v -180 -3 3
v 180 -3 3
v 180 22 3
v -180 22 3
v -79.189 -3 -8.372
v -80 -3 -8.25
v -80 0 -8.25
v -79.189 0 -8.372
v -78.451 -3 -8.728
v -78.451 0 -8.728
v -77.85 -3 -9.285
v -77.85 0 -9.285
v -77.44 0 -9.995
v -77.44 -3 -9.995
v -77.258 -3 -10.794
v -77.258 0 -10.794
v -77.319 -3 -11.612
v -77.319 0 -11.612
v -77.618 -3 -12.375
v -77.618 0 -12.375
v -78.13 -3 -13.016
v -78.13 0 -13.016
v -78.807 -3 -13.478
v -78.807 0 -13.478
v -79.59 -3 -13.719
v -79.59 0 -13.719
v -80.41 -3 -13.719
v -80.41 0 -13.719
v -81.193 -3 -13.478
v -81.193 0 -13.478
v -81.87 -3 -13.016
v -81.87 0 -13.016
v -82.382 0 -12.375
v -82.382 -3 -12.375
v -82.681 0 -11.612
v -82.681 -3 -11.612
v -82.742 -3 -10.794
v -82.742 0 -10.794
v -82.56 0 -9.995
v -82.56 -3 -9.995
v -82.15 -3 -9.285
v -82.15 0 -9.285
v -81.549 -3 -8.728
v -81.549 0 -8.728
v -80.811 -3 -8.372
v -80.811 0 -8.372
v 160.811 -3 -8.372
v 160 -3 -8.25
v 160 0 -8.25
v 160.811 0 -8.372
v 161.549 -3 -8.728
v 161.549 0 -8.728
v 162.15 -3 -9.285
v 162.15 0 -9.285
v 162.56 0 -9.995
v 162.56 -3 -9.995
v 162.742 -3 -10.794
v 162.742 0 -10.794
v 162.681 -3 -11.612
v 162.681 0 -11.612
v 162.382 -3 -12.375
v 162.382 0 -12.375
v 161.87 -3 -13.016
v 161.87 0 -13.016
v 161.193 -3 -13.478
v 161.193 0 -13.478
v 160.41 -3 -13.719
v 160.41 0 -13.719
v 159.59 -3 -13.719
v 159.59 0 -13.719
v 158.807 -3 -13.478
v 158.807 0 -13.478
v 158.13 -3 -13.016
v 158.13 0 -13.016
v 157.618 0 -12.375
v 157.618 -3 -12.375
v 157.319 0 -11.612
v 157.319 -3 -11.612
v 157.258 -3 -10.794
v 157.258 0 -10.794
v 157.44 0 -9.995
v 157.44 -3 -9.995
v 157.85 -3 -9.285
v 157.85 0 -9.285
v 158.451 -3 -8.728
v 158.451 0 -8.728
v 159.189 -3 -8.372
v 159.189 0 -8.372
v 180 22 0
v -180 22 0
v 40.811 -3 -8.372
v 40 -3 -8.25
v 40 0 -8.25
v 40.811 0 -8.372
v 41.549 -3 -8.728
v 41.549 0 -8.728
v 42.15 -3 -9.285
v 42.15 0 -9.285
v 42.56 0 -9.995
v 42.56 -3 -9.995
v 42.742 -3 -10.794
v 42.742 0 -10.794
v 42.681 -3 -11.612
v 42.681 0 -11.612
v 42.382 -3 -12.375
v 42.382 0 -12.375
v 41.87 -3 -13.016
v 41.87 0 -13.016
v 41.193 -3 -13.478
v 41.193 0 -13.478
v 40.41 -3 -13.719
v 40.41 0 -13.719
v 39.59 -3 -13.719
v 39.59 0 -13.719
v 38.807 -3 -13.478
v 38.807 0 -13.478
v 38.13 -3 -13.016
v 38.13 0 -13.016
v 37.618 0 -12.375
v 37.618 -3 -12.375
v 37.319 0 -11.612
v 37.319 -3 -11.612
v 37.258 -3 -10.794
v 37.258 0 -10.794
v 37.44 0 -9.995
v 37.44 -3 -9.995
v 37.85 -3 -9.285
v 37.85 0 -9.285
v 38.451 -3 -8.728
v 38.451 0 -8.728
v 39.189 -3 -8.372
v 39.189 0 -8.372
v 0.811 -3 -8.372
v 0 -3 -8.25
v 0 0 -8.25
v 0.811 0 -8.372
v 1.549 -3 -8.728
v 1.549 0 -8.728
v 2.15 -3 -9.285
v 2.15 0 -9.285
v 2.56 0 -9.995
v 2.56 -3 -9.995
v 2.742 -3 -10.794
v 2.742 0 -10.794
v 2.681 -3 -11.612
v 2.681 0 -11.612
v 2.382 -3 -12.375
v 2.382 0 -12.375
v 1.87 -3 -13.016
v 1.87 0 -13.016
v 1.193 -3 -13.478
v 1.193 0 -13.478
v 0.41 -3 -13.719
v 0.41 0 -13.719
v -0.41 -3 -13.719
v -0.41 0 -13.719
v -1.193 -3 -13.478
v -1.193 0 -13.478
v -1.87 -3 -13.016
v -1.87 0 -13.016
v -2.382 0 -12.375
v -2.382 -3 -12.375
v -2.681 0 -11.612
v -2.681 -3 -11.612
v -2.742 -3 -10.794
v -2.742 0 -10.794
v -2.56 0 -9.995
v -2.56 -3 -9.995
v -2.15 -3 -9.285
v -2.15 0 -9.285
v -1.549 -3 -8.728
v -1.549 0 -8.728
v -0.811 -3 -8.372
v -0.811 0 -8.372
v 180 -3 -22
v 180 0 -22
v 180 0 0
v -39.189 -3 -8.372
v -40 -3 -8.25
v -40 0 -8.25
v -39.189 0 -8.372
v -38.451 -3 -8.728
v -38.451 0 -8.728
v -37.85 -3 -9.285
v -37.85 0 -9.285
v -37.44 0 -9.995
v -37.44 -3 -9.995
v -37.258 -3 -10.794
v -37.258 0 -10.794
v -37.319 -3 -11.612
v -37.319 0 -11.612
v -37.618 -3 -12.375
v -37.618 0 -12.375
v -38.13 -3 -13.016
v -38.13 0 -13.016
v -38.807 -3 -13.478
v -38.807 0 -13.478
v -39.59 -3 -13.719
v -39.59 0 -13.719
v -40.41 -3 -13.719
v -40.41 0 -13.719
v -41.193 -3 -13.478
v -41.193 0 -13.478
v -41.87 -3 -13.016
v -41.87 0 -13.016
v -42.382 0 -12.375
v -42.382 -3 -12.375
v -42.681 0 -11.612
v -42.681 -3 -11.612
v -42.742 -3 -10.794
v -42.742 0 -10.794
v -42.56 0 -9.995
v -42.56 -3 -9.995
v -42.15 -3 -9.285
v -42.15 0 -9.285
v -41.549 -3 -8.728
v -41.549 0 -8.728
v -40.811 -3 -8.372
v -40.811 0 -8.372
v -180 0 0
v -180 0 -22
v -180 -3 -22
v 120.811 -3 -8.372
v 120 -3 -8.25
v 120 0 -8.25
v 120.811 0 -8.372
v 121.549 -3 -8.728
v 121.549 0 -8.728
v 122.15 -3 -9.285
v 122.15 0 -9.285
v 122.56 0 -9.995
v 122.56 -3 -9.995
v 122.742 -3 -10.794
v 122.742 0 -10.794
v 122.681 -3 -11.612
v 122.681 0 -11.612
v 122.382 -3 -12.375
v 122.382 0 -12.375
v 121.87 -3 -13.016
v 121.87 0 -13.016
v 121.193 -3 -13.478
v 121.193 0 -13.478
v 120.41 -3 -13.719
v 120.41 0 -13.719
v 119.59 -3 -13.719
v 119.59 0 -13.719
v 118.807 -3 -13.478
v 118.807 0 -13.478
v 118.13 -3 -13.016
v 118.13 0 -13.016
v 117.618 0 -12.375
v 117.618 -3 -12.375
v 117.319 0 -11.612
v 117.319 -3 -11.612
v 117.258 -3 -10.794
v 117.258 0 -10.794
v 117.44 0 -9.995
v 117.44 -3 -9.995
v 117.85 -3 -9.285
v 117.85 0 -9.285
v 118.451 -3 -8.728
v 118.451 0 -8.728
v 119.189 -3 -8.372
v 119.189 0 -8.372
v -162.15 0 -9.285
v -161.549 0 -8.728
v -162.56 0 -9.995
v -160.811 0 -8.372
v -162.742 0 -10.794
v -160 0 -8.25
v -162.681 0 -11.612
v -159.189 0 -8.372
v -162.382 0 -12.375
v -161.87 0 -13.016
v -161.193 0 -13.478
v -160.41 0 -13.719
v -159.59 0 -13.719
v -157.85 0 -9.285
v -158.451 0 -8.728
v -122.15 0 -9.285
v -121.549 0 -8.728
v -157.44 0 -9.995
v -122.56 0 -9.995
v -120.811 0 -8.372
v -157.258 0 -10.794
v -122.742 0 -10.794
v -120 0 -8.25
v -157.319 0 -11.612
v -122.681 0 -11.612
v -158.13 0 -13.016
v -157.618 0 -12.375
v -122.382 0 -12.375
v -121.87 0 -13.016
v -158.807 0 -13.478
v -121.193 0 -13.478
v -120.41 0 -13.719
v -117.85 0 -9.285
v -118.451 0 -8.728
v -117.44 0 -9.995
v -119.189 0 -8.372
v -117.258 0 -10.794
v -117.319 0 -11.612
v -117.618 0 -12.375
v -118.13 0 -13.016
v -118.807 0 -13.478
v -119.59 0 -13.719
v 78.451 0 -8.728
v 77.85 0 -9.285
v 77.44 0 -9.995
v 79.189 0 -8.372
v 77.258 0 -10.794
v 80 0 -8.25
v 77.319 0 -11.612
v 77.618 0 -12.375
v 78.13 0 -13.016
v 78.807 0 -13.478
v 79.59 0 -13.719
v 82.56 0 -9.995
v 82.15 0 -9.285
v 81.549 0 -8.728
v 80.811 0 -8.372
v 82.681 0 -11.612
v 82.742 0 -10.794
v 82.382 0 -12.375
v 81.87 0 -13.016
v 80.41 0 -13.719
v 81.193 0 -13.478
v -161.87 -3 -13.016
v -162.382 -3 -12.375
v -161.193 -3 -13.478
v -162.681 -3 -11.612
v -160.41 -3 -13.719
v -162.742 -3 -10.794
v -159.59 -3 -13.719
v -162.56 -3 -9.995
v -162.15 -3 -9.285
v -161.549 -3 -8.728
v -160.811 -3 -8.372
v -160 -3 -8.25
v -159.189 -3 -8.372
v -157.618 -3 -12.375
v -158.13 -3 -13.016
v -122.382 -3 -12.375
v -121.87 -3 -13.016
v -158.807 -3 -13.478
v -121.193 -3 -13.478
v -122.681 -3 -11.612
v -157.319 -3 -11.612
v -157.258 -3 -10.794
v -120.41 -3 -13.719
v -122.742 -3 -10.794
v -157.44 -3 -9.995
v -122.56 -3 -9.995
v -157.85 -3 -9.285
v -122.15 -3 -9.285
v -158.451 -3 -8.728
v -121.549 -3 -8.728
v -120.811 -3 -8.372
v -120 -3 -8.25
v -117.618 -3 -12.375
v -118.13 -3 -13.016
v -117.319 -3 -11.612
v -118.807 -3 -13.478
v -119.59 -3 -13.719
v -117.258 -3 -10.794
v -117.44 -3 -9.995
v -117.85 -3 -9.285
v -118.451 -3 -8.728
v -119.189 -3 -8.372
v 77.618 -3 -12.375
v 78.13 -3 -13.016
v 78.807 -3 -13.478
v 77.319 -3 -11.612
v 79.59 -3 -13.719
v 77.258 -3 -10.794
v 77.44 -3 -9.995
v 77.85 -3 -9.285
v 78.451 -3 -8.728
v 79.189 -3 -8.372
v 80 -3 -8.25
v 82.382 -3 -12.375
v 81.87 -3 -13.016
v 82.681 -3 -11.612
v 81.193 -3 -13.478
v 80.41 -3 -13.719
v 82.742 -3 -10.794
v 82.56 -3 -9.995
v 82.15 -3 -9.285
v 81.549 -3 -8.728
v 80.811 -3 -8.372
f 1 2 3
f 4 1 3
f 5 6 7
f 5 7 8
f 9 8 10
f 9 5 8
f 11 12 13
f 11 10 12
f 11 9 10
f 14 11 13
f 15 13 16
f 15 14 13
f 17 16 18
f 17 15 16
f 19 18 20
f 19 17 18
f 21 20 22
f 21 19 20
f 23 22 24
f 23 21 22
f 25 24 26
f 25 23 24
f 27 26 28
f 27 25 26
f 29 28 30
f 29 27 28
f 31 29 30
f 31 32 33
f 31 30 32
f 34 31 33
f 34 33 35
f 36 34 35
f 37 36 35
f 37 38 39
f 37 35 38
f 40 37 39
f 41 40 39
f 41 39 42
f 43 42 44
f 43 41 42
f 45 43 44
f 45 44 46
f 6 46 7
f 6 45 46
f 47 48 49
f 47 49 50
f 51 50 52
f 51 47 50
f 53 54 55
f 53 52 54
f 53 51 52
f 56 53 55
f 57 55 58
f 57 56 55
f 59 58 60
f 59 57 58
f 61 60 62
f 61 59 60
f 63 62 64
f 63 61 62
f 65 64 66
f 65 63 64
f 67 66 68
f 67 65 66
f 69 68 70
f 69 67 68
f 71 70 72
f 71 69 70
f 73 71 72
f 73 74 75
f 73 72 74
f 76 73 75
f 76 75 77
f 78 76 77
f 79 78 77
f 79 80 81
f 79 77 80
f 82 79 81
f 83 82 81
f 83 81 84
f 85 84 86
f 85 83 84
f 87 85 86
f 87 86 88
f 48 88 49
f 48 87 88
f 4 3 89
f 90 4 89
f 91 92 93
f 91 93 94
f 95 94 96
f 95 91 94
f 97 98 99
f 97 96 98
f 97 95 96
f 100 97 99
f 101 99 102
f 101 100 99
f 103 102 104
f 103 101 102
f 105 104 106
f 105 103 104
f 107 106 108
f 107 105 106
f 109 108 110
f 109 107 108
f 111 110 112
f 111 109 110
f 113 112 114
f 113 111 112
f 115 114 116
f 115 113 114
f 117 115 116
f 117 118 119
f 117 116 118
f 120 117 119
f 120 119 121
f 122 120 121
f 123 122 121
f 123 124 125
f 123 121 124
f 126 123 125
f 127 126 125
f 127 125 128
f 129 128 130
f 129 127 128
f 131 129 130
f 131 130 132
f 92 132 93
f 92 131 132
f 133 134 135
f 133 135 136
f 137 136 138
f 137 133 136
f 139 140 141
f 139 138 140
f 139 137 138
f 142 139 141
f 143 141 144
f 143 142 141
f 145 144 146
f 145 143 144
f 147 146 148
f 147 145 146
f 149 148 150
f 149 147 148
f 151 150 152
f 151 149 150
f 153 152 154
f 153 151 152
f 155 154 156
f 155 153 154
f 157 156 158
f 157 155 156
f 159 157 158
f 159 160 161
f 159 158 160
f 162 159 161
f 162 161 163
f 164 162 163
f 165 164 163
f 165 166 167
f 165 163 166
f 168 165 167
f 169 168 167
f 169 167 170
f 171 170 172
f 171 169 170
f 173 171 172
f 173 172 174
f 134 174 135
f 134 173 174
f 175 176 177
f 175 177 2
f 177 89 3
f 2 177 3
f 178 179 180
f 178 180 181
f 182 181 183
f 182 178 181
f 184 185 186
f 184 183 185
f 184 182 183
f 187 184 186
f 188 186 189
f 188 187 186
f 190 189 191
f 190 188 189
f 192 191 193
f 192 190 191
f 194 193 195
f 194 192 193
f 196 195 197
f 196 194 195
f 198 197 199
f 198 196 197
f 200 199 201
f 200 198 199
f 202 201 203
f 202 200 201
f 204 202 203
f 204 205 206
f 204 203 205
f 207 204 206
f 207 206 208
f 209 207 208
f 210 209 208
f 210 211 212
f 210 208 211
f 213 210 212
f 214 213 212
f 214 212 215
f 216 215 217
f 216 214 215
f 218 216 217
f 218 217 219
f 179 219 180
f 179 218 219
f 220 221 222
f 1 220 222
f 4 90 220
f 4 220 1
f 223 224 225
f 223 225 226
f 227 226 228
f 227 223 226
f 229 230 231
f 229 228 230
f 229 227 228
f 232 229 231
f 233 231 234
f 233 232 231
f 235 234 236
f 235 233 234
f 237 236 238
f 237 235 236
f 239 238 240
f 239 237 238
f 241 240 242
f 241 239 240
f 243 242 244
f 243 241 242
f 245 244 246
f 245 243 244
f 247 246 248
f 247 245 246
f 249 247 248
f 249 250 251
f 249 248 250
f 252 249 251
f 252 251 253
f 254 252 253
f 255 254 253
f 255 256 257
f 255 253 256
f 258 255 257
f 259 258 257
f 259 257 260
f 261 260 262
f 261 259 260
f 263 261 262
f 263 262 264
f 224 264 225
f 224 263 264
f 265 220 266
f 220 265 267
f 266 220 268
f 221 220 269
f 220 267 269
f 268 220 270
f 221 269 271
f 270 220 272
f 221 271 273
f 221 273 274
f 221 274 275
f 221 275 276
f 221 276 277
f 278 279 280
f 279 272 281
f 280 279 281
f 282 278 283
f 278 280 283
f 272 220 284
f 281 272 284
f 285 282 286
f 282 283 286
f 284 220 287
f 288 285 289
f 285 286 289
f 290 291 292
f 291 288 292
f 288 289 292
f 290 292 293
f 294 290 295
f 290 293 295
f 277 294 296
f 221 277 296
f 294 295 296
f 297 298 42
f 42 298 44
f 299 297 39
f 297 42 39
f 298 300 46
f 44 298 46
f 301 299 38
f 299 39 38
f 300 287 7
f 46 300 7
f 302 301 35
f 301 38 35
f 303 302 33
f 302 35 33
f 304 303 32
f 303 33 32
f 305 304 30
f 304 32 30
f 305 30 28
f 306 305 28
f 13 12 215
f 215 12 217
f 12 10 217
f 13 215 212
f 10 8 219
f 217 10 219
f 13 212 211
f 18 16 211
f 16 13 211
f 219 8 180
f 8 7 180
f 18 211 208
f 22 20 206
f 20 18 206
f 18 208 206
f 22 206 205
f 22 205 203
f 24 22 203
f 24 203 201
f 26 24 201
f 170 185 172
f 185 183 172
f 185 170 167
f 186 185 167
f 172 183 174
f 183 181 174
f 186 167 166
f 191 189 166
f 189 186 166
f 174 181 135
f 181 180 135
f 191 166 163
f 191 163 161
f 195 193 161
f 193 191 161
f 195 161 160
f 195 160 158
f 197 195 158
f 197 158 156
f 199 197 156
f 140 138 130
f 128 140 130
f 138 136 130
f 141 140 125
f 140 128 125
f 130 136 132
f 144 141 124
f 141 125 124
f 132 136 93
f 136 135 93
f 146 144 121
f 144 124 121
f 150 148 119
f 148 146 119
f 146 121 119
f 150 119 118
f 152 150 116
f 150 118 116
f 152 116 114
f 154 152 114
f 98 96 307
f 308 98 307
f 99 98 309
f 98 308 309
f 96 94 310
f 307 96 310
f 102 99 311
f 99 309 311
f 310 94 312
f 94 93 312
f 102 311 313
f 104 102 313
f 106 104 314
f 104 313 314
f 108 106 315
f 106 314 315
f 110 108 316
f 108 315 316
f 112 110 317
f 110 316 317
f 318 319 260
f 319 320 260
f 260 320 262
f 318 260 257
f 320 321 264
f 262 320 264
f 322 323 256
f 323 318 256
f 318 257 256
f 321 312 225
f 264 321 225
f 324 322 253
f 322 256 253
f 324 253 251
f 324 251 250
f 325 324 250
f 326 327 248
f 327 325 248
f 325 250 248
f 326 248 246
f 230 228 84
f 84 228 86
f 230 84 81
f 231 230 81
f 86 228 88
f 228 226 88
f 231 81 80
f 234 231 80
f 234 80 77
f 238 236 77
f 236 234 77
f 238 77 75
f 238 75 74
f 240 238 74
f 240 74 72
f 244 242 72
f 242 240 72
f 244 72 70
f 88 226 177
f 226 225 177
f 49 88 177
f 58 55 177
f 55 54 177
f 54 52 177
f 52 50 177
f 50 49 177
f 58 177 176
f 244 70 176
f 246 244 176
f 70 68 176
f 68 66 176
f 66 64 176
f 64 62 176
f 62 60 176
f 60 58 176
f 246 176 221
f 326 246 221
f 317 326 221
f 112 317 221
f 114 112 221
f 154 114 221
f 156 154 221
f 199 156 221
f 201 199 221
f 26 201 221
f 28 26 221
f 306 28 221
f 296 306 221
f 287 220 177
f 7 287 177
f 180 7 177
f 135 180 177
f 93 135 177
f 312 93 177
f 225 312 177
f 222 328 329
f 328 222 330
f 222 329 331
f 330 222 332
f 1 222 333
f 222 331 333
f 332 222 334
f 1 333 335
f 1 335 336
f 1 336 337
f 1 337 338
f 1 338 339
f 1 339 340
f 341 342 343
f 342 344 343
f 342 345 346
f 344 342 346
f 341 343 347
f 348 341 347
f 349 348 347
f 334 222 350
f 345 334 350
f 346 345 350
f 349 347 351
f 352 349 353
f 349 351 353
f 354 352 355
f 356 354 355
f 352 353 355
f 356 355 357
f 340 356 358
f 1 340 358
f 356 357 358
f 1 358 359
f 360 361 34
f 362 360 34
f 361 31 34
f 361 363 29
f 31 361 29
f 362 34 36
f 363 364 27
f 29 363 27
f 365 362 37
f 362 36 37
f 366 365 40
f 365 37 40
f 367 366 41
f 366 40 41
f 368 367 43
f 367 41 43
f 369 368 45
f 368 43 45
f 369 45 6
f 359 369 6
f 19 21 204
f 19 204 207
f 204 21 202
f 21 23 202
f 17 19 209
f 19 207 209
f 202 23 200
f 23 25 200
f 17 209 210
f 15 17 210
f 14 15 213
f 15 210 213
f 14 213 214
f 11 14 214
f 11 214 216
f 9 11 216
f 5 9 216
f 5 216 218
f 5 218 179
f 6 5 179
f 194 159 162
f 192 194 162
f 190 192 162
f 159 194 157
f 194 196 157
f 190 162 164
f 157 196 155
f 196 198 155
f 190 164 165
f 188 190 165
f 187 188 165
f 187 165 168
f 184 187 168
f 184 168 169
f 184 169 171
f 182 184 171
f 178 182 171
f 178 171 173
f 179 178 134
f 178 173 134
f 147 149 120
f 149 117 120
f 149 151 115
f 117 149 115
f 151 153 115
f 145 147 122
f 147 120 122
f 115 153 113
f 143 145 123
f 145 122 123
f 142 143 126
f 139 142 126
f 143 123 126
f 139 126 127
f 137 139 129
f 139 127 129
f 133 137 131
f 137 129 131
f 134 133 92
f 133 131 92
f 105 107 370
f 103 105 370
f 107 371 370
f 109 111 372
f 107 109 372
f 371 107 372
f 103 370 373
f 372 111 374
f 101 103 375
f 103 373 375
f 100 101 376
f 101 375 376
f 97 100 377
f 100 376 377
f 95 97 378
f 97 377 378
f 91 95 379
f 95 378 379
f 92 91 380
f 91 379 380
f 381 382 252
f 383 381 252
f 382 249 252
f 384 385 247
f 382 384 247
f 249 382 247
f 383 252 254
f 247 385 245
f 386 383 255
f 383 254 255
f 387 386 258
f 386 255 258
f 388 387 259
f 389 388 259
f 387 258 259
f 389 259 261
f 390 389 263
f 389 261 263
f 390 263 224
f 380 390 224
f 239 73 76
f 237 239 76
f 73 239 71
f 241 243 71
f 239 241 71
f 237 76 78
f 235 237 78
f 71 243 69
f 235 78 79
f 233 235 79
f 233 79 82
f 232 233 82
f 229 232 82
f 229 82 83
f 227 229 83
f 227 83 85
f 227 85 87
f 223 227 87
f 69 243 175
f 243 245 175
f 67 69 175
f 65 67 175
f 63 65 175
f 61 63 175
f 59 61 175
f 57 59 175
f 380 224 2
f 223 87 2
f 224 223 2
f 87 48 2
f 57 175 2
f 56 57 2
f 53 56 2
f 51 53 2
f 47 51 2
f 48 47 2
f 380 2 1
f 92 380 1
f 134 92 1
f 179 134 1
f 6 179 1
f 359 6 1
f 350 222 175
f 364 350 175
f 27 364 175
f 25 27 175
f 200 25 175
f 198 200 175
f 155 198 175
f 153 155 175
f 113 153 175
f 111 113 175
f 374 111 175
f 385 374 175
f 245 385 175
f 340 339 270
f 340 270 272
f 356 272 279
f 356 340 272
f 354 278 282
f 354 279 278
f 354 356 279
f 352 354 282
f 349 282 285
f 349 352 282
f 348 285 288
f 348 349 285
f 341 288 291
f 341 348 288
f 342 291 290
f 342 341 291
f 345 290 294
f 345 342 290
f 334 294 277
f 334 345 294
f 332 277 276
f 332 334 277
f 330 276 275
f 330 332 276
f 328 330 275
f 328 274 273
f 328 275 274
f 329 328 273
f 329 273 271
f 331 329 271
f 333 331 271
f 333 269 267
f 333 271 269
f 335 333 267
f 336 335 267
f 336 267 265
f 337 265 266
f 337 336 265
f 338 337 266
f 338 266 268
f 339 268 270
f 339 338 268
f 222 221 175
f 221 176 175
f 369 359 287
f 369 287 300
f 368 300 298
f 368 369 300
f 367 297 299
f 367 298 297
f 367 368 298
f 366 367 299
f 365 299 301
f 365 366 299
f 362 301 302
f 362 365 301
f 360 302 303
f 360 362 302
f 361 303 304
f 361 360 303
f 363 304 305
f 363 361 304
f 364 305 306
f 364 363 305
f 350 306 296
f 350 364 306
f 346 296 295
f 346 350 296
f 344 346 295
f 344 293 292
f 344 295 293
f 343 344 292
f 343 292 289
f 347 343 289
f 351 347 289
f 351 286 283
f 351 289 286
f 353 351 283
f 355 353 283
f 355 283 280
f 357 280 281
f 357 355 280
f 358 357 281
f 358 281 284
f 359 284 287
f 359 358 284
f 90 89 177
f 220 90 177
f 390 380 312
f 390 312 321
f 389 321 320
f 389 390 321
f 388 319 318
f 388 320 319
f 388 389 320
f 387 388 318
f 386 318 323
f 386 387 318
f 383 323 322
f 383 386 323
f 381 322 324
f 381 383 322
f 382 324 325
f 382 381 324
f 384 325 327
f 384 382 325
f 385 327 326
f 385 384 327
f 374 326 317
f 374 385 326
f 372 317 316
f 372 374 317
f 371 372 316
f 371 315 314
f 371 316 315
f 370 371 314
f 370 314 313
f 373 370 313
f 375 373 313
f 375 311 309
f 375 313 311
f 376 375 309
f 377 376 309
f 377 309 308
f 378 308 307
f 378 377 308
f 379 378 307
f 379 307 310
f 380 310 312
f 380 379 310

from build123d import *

# Parameters (mm, degrees)
BOSS_EXTRUDE1_DEPTH     = 180
CUT_EXTRUDE1_DEPTH      = 183.66909974
CUT_EXTRUDE1_DEPTH_BACK = 183.66909974
SKETCH2_R               = 2.75


with BuildPart() as part:
    # Sketch1 → Boss-Extrude1 (new, symmetric)
    with BuildSketch(Plane(origin=(0, 0, 0), x_dir=(0, 0, -1), z_dir=(1, 0, 0))):
        Polygon((0, 22), (0, 0), (22, 0), (22, -3), (-3, -3), (-3, 22), align=None)
    extrude(amount=BOSS_EXTRUDE1_DEPTH, both=True)

    # Sketch2 → Cut-Extrude1 (cut, two sides: drawn at the far end of the back side and taken through both)
    with BuildSketch(Plane(origin=(0, 0, 0), x_dir=(1, 0, 0), z_dir=(0, 1, 0)).offset(-CUT_EXTRUDE1_DEPTH_BACK)):
        with Locations(Location((-160, 11, 0), (0, 0, 270))):
            Circle(SKETCH2_R)
        with Locations(Location((-120, 11, 0), (0, 0, 270))):
            Circle(SKETCH2_R)
        with Locations(Location((-80, 11, 0), (0, 0, 270))):
            Circle(SKETCH2_R)
        with Locations(Location((-40, 11, 0), (0, 0, 270))):
            Circle(SKETCH2_R)
        with Locations(Location((0, 11, 0), (0, 0, 270))):
            Circle(SKETCH2_R)
        with Locations(Location((40, 11, 0), (0, 0, 270))):
            Circle(SKETCH2_R)
        with Locations(Location((80, 11, 0), (0, 0, 270))):
            Circle(SKETCH2_R)
        with Locations(Location((120, 11, 0), (0, 0, 270))):
            Circle(SKETCH2_R)
        with Locations(Location((160, 11, 0), (0, 0, 270))):
            Circle(SKETCH2_R)
    extrude(amount=CUT_EXTRUDE1_DEPTH + CUT_EXTRUDE1_DEPTH_BACK, mode=Mode.SUBTRACT)


solid = part.part
